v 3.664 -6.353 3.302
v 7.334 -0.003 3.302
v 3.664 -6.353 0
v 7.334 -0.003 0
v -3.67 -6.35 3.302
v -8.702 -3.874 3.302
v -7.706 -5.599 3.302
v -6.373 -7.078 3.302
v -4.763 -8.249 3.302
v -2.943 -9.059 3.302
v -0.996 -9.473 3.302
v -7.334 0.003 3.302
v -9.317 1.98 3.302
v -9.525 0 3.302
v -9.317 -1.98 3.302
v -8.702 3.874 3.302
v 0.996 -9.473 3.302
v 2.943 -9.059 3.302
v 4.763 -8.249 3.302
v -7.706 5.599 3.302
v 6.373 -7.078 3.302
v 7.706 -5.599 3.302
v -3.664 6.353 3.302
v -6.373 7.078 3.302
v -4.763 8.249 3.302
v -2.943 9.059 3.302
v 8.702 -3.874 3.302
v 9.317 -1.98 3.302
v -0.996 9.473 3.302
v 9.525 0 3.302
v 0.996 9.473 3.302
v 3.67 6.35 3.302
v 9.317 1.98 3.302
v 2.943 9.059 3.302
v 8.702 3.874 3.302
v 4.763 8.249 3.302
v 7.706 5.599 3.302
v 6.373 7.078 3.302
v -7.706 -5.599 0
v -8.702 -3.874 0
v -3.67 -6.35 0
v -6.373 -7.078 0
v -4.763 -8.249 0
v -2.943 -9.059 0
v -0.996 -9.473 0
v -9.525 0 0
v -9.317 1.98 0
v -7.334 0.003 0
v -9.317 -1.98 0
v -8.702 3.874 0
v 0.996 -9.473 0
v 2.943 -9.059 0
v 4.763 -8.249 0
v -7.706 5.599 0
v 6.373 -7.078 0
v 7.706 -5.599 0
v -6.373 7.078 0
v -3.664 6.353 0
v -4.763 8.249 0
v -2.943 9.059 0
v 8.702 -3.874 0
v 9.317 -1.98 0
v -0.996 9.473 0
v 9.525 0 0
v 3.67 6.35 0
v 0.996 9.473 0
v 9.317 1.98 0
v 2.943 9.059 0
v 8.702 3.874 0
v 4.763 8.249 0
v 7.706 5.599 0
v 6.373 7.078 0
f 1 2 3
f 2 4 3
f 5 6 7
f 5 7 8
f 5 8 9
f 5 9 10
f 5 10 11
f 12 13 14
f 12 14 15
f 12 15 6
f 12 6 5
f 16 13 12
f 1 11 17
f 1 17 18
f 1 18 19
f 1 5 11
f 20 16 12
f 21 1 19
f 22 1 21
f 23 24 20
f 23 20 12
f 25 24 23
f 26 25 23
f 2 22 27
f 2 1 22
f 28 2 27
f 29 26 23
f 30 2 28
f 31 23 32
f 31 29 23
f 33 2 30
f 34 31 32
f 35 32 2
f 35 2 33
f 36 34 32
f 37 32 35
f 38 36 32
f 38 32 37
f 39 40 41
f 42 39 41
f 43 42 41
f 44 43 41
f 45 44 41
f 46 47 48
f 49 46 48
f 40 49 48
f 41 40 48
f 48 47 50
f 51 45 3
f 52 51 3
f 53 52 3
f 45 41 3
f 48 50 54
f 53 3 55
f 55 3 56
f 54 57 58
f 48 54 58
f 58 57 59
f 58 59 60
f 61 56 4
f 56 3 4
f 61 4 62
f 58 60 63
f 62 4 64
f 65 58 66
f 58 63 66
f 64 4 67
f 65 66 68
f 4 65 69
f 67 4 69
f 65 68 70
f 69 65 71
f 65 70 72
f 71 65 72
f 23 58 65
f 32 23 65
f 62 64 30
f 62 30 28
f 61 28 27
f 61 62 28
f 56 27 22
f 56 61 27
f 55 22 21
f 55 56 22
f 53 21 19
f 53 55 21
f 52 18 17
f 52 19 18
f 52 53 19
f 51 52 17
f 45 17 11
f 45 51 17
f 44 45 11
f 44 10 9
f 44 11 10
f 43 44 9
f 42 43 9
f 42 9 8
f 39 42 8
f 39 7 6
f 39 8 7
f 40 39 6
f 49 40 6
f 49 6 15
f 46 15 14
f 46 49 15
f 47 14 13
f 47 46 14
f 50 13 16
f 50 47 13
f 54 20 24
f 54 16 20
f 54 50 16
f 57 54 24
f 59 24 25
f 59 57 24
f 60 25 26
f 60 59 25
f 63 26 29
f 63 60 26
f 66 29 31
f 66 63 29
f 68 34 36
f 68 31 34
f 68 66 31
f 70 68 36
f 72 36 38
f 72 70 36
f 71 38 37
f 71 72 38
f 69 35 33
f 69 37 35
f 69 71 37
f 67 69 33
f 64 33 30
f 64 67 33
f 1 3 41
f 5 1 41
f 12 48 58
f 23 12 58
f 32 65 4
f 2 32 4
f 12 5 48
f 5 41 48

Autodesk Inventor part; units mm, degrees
ref_plane "YZ Plane" through (0, 0, 0) normal (1, 0, 0) x (0, 1, 0)
ref_plane "XZ Plane" through (0, 0, 0) normal (0, 1, 0) x (-1, 0, 0)
ref_plane "XY Plane" through (0, 0, 0) normal (0, 0, 1) x (1, 0, 0)
sketch "Sketch1" plane through (0, 0, 0) normal (0, 0, 1) x (1, 0, 0)
  circle A0 centre (0, 0) radius 9.525
  line L0 (0, 0) -> (0, 6.35) construction
  line L1 (3.6695, 6.35) -> (7.334, -0.0028)
  line L2 (7.334, -0.0028) -> (3.6645, -6.3528)
  line L3 (3.6645, -6.3528) -> (-3.6695, -6.35)
  line L4 (-3.6695, -6.35) -> (-7.334, 0.0028)
  line L5 (-7.334, 0.0028) -> (-3.6645, 6.3528)
  line L6 (-3.6645, 6.3528) -> (3.6695, 6.35)
  dimension "d0" = 19.05
  dimension "d1" = 6.35
extrude "Extrusion1" add sketch "Sketch1" along normal blind 3.302
properties part number "3D Model Spacer Arm"
